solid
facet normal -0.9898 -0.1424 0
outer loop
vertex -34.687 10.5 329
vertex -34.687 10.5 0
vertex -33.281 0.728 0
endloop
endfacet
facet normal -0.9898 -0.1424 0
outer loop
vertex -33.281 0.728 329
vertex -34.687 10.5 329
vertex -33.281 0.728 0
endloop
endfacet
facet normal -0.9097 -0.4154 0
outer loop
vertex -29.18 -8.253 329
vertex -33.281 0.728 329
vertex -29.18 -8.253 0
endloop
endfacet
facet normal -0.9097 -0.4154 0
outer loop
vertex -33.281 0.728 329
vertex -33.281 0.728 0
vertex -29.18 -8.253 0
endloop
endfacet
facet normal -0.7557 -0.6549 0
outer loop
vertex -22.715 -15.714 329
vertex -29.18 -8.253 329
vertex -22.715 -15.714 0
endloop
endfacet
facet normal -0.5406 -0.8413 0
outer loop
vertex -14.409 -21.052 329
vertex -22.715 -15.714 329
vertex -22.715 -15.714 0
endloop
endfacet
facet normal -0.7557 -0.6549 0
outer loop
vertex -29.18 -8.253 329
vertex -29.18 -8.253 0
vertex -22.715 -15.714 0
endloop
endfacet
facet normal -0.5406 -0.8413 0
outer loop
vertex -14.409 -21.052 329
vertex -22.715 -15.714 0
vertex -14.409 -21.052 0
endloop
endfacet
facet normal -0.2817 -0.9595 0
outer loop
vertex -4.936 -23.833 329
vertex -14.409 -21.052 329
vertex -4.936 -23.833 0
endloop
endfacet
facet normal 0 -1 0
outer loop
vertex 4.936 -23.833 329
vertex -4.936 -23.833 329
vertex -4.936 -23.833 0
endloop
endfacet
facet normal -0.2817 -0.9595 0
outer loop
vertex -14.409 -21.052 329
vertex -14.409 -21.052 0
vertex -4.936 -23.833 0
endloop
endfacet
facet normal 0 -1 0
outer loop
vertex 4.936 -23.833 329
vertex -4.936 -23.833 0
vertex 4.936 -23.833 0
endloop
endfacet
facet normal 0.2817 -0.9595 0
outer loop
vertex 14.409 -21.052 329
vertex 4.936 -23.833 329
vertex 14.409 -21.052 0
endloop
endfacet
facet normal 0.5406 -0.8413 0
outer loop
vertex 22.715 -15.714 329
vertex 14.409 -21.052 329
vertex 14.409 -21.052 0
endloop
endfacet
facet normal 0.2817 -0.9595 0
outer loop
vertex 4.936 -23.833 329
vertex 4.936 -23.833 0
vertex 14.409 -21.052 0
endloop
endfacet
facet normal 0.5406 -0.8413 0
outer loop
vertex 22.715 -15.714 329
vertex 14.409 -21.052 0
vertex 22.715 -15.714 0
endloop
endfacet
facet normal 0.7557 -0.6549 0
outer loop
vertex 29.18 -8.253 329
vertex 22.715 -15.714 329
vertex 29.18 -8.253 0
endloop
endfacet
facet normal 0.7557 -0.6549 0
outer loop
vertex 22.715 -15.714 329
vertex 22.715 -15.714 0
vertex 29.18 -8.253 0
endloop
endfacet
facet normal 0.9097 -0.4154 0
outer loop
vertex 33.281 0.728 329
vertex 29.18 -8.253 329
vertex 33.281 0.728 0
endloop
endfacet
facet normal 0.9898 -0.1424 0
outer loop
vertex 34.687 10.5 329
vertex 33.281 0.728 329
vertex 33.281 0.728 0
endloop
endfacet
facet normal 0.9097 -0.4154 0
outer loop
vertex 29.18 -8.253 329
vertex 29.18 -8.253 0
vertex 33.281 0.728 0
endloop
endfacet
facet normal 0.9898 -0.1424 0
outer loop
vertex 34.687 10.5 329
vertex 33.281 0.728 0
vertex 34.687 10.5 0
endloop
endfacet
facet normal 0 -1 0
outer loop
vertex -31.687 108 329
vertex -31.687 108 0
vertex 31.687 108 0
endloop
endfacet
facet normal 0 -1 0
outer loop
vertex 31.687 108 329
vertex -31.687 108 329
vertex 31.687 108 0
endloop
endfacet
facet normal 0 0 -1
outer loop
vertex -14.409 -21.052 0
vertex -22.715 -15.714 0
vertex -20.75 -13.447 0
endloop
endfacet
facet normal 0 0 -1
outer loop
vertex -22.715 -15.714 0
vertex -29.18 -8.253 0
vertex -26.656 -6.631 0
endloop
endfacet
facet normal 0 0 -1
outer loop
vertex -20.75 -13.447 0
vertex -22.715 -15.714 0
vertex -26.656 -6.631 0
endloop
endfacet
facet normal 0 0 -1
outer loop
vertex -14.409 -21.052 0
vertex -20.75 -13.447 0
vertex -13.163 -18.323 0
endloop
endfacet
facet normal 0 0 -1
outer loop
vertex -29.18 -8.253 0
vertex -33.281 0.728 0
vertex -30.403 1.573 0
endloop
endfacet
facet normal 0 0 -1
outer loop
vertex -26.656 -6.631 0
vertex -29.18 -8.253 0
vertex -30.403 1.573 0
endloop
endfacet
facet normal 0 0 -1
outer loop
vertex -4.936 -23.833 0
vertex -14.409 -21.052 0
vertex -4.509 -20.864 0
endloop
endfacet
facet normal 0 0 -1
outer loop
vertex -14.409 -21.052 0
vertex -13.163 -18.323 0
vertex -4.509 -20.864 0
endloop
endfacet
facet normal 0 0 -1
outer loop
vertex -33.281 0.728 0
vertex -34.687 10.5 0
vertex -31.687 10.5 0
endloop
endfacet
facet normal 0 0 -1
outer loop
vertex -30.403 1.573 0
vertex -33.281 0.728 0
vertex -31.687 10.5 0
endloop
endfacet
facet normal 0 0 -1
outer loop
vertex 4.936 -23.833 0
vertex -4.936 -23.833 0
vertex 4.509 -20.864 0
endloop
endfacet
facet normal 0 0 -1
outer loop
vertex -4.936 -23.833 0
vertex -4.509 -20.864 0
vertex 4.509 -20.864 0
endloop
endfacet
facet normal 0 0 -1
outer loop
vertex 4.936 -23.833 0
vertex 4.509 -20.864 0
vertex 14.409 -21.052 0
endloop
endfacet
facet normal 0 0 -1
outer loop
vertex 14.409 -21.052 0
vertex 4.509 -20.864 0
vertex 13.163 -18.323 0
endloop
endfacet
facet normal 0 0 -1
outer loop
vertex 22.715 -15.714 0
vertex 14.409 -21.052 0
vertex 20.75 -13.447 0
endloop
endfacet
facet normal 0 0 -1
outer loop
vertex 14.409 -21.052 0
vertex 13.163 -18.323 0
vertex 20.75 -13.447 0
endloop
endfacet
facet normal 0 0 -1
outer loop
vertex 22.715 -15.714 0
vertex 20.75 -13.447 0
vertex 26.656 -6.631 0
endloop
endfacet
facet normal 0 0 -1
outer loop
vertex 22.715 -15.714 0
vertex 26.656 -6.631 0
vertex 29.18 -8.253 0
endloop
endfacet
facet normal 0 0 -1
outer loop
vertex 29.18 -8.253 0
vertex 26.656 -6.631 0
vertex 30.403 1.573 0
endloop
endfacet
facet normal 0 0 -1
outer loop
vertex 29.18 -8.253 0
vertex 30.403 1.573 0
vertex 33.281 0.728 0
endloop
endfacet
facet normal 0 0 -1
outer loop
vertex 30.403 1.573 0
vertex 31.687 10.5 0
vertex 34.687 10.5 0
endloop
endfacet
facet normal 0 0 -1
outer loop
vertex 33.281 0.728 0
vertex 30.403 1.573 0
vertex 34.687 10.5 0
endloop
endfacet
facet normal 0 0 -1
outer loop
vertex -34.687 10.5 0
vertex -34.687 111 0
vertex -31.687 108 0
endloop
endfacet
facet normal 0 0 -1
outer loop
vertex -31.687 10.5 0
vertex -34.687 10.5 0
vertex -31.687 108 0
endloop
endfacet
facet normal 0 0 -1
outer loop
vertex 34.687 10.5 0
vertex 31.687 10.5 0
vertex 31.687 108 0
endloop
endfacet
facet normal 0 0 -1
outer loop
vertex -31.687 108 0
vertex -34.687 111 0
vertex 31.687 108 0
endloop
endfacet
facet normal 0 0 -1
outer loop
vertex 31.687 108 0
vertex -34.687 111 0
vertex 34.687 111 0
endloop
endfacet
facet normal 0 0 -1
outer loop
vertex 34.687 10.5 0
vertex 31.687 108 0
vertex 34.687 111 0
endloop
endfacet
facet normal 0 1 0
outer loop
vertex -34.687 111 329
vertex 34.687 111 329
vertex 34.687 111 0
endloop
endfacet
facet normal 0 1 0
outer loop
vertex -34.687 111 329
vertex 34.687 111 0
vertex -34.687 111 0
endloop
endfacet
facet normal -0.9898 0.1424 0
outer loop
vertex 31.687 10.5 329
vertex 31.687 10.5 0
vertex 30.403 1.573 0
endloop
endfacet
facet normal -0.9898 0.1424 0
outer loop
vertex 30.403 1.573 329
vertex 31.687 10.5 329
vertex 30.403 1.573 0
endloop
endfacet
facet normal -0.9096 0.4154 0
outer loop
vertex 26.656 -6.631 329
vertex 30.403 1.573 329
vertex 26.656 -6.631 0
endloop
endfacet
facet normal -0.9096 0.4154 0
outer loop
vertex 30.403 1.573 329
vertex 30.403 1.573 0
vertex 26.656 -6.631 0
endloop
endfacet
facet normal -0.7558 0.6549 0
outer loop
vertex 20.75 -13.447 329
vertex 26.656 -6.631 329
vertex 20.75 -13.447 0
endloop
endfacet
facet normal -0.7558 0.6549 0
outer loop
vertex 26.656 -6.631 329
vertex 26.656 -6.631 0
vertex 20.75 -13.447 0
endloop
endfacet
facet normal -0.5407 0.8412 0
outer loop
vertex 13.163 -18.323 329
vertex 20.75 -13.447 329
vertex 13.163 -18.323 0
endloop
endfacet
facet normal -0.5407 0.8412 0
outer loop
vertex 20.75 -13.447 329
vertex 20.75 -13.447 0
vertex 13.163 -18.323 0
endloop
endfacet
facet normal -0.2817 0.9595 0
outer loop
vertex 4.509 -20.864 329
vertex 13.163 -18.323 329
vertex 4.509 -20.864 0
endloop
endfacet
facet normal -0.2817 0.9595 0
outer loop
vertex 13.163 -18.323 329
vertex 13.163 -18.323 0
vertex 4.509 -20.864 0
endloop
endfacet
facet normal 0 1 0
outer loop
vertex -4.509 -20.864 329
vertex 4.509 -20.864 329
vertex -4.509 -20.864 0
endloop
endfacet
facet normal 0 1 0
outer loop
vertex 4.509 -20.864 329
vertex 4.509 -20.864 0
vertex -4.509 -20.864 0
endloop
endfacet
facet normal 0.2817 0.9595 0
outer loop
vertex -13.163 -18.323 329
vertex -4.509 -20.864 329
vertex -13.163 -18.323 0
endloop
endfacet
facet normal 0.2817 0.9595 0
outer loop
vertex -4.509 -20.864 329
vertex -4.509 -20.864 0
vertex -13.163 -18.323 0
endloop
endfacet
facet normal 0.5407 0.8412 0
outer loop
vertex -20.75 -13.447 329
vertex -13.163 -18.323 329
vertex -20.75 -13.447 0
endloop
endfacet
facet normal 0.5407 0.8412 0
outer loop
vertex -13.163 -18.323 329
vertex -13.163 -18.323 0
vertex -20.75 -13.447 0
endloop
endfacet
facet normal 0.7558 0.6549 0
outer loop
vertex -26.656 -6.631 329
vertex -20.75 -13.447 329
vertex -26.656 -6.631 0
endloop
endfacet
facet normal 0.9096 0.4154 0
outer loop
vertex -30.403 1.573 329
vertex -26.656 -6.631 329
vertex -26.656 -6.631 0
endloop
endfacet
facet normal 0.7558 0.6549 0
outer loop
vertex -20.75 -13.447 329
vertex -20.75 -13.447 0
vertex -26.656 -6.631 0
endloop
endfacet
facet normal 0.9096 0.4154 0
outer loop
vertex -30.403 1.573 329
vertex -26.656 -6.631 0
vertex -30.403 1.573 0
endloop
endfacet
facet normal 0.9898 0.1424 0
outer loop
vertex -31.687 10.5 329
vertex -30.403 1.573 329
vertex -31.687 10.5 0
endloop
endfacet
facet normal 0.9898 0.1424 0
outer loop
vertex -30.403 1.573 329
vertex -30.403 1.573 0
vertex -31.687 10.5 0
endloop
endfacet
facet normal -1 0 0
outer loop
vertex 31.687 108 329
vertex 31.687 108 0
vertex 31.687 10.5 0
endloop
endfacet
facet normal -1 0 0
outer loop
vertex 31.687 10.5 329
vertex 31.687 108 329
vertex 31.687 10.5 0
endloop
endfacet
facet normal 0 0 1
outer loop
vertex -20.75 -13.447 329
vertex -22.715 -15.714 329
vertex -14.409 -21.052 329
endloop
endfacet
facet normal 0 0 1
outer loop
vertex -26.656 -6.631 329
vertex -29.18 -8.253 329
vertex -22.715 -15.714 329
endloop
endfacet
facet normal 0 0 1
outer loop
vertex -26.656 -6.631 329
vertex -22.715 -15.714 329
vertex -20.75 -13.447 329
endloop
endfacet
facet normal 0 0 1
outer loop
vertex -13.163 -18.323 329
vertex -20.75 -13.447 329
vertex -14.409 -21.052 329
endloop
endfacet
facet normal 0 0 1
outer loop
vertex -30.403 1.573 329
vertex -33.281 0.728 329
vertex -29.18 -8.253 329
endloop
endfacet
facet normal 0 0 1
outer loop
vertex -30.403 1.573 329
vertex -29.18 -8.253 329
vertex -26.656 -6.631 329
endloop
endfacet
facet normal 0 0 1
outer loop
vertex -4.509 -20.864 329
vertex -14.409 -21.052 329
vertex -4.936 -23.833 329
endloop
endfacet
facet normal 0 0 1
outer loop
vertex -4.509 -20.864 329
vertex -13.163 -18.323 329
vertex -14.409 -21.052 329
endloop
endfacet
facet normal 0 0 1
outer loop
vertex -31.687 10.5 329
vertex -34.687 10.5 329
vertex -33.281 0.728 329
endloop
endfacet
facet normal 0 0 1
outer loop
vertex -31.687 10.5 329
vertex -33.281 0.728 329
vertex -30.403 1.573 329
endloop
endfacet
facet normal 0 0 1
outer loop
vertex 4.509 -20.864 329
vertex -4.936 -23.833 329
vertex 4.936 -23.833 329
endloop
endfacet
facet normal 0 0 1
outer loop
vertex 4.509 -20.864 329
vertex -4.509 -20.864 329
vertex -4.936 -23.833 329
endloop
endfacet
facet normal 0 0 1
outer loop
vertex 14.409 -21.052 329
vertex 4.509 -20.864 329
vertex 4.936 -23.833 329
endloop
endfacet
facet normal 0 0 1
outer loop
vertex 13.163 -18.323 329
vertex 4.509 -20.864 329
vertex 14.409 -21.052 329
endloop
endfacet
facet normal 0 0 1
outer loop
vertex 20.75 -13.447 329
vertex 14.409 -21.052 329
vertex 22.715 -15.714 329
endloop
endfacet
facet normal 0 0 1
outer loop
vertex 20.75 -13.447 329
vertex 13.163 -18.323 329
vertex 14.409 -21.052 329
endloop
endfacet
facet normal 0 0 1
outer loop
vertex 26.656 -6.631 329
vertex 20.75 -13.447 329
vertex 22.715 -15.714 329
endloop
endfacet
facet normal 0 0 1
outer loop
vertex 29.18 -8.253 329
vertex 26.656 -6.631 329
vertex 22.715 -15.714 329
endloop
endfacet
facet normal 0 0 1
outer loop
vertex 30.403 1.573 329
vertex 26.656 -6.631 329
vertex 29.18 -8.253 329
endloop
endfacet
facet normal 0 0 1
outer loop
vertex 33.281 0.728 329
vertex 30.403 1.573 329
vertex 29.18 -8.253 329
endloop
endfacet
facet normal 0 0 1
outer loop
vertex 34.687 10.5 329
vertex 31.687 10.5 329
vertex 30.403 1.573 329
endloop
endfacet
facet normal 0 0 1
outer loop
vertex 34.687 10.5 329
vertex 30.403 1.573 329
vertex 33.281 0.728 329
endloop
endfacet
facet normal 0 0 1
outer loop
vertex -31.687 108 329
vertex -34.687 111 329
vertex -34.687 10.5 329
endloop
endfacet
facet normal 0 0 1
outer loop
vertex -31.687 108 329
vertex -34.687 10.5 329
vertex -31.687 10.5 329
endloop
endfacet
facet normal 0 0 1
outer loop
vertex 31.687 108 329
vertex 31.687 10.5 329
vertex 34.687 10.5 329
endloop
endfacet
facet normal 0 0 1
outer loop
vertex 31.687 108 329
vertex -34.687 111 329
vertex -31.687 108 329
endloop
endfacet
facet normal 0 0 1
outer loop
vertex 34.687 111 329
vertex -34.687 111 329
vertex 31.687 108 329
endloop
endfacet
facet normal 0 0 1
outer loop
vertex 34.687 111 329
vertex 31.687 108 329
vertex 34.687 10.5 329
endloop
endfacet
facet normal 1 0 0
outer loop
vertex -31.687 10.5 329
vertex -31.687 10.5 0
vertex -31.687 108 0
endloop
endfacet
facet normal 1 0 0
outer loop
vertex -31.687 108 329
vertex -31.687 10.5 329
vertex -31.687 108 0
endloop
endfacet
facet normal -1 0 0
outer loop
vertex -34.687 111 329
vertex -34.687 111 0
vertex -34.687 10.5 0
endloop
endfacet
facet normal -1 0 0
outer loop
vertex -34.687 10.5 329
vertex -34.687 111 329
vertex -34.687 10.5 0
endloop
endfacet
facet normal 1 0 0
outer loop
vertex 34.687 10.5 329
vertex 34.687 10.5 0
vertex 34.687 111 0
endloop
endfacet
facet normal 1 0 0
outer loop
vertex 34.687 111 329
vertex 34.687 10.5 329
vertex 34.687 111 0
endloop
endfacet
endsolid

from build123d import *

# Parameters (mm, degrees)
F2_DEPTH = 329


with BuildPart() as f2:
    # F1 (on Top) → F2 (new body)
    with BuildSketch(Plane.XY):
        with BuildLine():
            Line((34.686533, 111), (-34.686533, 111))
            Line((-34.686533, 111), (-34.686533, 10.5))
            ThreePointArc((-34.686533, 10.5), (0, -24.186533), (34.686533, 10.5))
            Line((34.686533, 10.5), (34.686533, 111))
        make_face()
        with BuildLine():
            Line((-31.686533, 10.5), (-31.686533, 108))
            Line((-31.686533, 108), (31.686533, 108))
            Line((31.686533, 108), (31.686533, 10.5))
            ThreePointArc((31.686533, 10.5), (0, -21.186533), (-31.686533, 10.5))
        make_face(mode=Mode.SUBTRACT)
    extrude(amount=F2_DEPTH)


solid = f2.part
